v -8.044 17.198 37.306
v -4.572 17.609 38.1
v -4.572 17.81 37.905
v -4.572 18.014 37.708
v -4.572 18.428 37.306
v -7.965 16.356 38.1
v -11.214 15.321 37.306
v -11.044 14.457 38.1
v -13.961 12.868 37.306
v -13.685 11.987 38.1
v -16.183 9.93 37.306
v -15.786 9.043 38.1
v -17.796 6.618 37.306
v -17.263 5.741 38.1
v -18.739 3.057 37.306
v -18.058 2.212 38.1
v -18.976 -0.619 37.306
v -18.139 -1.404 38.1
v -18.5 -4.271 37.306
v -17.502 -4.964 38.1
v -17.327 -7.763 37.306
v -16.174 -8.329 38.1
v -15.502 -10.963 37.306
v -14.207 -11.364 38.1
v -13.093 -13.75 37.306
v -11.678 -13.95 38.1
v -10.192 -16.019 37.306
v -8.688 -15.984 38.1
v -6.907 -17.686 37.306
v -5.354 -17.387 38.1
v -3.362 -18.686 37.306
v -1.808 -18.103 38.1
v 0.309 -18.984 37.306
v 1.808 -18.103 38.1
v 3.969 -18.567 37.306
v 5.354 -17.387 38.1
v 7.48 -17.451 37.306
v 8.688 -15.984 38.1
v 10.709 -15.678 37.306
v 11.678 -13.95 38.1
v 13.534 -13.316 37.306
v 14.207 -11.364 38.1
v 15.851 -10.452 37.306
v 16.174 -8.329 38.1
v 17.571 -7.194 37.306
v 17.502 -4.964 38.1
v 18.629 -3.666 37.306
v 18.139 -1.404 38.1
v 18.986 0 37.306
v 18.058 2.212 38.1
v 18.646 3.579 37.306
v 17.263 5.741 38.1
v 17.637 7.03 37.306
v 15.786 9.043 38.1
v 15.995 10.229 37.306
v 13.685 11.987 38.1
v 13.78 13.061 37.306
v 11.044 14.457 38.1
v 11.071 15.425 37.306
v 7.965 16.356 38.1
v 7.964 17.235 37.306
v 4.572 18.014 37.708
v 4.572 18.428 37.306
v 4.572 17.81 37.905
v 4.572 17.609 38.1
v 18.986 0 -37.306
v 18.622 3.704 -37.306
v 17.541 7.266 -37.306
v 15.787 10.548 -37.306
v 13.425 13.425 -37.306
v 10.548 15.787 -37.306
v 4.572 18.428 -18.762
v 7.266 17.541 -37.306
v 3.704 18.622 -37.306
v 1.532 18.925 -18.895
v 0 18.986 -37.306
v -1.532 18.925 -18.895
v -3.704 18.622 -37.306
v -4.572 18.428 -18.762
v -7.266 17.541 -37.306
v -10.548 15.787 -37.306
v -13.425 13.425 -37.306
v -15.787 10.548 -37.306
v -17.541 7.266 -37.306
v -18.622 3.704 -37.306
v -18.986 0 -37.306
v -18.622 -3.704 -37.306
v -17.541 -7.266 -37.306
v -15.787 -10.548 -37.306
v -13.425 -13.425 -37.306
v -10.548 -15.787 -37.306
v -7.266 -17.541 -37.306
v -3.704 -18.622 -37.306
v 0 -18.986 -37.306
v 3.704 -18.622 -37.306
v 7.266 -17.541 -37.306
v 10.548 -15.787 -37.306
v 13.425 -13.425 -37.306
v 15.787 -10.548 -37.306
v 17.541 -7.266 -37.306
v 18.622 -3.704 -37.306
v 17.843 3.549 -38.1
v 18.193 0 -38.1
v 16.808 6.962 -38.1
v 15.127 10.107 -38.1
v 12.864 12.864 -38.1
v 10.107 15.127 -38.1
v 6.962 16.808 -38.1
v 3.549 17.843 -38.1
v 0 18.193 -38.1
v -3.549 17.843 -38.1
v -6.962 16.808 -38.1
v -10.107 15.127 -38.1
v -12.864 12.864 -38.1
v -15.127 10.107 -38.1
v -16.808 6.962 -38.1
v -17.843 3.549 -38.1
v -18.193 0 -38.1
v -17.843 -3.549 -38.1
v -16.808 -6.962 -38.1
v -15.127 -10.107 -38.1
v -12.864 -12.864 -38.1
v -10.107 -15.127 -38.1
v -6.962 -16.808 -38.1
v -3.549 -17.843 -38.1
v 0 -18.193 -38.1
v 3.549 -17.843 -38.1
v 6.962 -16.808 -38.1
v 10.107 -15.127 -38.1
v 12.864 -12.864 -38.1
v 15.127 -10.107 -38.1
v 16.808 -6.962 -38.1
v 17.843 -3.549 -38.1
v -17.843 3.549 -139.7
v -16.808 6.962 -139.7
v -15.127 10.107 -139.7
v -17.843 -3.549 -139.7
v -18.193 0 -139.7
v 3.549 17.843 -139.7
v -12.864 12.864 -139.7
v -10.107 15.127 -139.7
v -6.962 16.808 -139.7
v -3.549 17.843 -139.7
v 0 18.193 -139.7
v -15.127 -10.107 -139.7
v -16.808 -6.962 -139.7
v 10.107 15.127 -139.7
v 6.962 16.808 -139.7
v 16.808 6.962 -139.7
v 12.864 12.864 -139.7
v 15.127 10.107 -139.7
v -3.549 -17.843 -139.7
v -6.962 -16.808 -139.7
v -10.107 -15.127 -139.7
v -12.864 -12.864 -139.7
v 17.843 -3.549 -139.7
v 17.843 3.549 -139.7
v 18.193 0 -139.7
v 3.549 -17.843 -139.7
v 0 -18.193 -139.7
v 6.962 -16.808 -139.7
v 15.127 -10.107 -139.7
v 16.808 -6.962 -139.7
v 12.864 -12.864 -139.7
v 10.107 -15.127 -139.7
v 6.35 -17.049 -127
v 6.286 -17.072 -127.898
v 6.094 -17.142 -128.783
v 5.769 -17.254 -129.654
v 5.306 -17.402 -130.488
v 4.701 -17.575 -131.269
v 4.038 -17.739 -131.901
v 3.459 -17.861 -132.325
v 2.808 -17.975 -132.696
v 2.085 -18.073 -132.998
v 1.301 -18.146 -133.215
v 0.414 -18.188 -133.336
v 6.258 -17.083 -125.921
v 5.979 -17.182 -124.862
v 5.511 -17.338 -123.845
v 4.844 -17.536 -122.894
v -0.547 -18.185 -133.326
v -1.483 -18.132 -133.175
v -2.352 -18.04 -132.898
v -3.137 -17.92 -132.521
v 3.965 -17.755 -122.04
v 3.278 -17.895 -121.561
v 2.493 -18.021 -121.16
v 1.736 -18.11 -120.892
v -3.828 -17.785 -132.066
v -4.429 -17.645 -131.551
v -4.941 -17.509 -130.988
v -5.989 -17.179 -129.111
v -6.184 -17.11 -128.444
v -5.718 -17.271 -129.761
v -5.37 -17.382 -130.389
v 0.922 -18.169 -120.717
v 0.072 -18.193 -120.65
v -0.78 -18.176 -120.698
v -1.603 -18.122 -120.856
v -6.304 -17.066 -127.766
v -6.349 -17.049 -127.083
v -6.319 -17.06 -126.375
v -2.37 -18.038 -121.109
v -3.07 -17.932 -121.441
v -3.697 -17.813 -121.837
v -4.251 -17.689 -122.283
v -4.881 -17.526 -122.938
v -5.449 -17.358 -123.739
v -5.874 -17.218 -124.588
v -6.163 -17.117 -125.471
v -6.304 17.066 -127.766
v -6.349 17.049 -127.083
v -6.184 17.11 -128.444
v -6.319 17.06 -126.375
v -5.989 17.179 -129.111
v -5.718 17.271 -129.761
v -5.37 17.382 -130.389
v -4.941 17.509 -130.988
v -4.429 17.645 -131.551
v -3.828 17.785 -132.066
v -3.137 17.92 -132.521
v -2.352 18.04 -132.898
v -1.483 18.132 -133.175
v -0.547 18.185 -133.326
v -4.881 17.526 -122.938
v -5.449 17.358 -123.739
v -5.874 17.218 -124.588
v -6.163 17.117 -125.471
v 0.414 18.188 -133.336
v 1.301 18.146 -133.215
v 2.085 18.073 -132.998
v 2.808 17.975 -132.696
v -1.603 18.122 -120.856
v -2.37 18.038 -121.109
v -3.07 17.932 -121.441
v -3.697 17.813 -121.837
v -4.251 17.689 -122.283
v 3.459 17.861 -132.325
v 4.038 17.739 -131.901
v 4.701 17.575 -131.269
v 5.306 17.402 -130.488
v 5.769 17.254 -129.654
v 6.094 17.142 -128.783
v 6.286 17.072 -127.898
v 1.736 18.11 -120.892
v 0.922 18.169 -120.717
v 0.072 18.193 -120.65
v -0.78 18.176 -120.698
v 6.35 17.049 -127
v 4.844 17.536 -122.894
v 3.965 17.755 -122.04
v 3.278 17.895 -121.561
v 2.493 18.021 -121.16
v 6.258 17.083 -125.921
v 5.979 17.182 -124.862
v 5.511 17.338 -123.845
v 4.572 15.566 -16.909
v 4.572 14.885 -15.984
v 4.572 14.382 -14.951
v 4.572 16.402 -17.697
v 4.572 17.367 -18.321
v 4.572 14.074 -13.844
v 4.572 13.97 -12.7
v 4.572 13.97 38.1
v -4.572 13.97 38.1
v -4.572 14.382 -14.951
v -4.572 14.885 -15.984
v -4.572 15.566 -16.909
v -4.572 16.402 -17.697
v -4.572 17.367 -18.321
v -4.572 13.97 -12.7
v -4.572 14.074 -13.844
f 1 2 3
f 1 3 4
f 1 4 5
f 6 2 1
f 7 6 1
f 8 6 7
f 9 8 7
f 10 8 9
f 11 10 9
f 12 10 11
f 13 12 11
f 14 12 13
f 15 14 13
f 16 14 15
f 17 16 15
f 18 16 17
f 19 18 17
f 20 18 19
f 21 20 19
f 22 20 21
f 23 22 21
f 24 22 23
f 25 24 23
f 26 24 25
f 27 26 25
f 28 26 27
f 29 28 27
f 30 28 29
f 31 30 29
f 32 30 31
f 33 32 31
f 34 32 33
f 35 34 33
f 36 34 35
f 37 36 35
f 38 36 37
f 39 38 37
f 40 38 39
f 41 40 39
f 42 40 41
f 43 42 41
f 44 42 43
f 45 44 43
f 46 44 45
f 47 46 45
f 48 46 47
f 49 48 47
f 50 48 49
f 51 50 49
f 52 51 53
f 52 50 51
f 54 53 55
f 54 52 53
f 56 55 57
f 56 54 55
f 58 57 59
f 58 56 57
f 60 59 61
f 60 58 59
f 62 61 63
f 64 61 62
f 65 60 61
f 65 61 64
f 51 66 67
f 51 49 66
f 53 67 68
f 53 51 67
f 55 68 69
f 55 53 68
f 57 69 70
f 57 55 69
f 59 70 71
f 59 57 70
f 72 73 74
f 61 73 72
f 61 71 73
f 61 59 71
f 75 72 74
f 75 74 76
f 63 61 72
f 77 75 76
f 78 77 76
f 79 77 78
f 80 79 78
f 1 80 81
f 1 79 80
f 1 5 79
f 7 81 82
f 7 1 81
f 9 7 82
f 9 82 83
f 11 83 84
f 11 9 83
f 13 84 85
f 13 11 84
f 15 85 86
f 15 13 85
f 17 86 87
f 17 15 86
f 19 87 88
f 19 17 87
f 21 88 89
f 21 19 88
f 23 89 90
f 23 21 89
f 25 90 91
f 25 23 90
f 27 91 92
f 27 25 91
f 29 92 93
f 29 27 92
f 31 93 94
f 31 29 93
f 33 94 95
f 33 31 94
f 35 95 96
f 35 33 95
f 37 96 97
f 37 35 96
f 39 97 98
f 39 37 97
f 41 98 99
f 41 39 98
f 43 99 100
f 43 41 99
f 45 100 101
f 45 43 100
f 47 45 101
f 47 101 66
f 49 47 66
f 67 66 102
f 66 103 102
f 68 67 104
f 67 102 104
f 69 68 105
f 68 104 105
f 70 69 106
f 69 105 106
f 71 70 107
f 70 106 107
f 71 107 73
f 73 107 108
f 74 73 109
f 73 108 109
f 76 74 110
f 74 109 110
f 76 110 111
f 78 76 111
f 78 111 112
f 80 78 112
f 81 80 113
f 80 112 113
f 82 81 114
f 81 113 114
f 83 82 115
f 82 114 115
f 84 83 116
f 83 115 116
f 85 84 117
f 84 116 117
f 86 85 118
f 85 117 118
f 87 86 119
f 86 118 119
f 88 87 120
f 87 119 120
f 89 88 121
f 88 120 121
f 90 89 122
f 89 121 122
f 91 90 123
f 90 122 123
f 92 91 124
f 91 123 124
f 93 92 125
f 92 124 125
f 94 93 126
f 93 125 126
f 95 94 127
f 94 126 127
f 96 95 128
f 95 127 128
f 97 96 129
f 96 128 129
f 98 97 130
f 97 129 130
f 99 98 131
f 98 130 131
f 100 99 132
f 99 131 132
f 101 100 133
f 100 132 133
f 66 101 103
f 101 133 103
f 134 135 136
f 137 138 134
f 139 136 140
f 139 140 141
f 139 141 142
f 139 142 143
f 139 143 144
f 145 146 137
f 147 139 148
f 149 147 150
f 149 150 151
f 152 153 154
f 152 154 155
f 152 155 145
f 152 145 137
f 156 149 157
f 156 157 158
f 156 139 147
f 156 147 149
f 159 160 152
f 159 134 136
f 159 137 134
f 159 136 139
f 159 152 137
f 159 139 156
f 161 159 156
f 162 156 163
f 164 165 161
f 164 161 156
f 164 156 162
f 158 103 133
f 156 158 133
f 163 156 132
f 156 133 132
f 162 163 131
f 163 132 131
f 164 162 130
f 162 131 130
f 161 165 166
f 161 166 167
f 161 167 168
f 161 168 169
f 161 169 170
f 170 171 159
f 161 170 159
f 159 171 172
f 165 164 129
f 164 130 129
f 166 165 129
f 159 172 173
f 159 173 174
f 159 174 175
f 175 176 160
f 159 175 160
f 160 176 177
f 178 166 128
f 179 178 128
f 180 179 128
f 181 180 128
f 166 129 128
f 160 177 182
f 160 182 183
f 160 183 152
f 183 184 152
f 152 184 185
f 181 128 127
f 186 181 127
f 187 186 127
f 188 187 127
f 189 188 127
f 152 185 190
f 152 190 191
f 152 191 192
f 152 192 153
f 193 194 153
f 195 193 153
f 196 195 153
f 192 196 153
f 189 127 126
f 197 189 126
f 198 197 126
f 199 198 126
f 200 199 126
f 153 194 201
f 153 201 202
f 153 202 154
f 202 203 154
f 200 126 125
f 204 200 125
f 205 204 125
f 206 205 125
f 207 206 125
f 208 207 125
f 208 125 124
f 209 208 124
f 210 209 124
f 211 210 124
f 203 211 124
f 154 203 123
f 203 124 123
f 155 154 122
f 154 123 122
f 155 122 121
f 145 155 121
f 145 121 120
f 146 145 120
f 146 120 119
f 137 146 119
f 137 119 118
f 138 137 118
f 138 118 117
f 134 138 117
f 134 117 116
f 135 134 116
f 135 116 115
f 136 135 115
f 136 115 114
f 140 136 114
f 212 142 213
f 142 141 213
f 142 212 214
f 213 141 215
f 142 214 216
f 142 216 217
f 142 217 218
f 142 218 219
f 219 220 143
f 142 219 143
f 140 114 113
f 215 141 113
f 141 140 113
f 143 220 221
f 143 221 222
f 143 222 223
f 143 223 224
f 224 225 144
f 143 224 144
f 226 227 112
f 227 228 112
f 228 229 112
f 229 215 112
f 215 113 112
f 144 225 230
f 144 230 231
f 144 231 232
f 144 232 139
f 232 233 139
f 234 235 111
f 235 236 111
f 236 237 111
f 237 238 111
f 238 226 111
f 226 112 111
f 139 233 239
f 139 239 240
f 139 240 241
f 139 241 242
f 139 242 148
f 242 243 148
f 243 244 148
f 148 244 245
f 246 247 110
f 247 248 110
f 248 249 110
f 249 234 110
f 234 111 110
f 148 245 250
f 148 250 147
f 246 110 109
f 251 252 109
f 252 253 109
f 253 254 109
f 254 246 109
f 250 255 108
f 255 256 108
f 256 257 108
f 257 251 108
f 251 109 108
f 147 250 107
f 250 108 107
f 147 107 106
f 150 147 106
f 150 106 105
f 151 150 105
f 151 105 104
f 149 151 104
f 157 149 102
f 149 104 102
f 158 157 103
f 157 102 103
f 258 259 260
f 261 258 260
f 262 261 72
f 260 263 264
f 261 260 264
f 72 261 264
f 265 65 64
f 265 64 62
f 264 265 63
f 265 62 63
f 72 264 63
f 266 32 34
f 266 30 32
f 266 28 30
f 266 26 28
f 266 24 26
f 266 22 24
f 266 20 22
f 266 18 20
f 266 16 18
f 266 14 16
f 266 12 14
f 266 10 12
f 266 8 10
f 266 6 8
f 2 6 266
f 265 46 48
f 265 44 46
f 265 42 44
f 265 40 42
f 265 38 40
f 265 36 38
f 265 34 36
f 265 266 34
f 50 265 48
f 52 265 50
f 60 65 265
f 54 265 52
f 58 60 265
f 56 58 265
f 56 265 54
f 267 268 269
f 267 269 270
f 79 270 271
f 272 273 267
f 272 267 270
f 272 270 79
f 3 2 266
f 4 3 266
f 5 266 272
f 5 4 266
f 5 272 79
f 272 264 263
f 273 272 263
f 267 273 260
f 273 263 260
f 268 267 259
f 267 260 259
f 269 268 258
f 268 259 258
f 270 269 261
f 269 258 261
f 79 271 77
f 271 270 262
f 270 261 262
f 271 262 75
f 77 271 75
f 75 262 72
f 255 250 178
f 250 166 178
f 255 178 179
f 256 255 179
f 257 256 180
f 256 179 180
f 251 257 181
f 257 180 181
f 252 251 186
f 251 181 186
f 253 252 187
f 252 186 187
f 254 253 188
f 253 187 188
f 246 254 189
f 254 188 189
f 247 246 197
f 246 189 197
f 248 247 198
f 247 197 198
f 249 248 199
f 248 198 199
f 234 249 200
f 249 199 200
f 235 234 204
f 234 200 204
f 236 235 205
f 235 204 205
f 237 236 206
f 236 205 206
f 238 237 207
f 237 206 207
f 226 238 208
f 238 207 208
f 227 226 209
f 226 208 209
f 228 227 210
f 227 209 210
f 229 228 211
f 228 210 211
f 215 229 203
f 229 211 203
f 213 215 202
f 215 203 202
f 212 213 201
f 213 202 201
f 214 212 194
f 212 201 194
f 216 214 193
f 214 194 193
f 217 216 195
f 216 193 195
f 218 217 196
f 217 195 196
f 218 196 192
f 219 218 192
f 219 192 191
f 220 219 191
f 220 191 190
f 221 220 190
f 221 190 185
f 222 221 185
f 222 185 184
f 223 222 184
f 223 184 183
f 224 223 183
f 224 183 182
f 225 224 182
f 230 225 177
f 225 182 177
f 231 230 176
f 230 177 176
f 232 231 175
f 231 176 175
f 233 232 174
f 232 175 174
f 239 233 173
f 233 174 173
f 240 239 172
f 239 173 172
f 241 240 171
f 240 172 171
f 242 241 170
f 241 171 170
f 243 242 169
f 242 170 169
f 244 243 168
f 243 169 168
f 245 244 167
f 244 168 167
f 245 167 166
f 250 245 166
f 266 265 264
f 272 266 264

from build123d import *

# Parameters (mm, degrees)
F0_R     = 18.9865
F1_DEPTH = 38.1
F2_SIZE  = 0.79375
F4_DEPTH = 4.572
F5_R     = 18.19275
F6_DEPTH = 101.6
F7_R     = 6.35
F8_DEPTH = 38.1


with BuildPart() as f1:
    # F0 (on Top) → F1 (new body, symmetric)
    with BuildSketch(Plane.XY):
        Circle(F0_R)
    extrude(amount=F1_DEPTH, both=True)

    # F2
    f2_edges = [f1.edges().sort_by_distance(p)[0] for p in [
        (-18.9865, 0, 38.1),
        (-18.9865, 0, -38.1),
    ]]
    chamfer(f2_edges, length=F2_SIZE)

    # F3 (on Right) → F4 (cut, symmetric)
    with BuildSketch(Plane.YZ):
        with BuildLine():
            Line((19.05, 38.1), (13.97, 38.1))
            Line((13.97, 38.1), (13.97, -12.7))
            ThreePointArc((13.97, -12.7), (15.4013111503, -16.7160926284), (19.05, -18.9217039467))
            Line((19.05, -18.9217039467), (19.05, 38.1))
        make_face()
    extrude(amount=F4_DEPTH, both=True, mode=Mode.SUBTRACT)

    # F5 (on face) → F6 (join)
    with BuildSketch(Plane(origin=(0, 0, -38.1), x_dir=(1, 0, 0), z_dir=(0, 0, -1))):
        Circle(F5_R)
    extrude(amount=F6_DEPTH)

    # F7 (on Front) → F8 (cut, symmetric)
    with BuildSketch(Plane.XZ):
        with Locations((0, -127)):
            Circle(F7_R)
    extrude(amount=F8_DEPTH, both=True, mode=Mode.SUBTRACT)


solid = f1.part
